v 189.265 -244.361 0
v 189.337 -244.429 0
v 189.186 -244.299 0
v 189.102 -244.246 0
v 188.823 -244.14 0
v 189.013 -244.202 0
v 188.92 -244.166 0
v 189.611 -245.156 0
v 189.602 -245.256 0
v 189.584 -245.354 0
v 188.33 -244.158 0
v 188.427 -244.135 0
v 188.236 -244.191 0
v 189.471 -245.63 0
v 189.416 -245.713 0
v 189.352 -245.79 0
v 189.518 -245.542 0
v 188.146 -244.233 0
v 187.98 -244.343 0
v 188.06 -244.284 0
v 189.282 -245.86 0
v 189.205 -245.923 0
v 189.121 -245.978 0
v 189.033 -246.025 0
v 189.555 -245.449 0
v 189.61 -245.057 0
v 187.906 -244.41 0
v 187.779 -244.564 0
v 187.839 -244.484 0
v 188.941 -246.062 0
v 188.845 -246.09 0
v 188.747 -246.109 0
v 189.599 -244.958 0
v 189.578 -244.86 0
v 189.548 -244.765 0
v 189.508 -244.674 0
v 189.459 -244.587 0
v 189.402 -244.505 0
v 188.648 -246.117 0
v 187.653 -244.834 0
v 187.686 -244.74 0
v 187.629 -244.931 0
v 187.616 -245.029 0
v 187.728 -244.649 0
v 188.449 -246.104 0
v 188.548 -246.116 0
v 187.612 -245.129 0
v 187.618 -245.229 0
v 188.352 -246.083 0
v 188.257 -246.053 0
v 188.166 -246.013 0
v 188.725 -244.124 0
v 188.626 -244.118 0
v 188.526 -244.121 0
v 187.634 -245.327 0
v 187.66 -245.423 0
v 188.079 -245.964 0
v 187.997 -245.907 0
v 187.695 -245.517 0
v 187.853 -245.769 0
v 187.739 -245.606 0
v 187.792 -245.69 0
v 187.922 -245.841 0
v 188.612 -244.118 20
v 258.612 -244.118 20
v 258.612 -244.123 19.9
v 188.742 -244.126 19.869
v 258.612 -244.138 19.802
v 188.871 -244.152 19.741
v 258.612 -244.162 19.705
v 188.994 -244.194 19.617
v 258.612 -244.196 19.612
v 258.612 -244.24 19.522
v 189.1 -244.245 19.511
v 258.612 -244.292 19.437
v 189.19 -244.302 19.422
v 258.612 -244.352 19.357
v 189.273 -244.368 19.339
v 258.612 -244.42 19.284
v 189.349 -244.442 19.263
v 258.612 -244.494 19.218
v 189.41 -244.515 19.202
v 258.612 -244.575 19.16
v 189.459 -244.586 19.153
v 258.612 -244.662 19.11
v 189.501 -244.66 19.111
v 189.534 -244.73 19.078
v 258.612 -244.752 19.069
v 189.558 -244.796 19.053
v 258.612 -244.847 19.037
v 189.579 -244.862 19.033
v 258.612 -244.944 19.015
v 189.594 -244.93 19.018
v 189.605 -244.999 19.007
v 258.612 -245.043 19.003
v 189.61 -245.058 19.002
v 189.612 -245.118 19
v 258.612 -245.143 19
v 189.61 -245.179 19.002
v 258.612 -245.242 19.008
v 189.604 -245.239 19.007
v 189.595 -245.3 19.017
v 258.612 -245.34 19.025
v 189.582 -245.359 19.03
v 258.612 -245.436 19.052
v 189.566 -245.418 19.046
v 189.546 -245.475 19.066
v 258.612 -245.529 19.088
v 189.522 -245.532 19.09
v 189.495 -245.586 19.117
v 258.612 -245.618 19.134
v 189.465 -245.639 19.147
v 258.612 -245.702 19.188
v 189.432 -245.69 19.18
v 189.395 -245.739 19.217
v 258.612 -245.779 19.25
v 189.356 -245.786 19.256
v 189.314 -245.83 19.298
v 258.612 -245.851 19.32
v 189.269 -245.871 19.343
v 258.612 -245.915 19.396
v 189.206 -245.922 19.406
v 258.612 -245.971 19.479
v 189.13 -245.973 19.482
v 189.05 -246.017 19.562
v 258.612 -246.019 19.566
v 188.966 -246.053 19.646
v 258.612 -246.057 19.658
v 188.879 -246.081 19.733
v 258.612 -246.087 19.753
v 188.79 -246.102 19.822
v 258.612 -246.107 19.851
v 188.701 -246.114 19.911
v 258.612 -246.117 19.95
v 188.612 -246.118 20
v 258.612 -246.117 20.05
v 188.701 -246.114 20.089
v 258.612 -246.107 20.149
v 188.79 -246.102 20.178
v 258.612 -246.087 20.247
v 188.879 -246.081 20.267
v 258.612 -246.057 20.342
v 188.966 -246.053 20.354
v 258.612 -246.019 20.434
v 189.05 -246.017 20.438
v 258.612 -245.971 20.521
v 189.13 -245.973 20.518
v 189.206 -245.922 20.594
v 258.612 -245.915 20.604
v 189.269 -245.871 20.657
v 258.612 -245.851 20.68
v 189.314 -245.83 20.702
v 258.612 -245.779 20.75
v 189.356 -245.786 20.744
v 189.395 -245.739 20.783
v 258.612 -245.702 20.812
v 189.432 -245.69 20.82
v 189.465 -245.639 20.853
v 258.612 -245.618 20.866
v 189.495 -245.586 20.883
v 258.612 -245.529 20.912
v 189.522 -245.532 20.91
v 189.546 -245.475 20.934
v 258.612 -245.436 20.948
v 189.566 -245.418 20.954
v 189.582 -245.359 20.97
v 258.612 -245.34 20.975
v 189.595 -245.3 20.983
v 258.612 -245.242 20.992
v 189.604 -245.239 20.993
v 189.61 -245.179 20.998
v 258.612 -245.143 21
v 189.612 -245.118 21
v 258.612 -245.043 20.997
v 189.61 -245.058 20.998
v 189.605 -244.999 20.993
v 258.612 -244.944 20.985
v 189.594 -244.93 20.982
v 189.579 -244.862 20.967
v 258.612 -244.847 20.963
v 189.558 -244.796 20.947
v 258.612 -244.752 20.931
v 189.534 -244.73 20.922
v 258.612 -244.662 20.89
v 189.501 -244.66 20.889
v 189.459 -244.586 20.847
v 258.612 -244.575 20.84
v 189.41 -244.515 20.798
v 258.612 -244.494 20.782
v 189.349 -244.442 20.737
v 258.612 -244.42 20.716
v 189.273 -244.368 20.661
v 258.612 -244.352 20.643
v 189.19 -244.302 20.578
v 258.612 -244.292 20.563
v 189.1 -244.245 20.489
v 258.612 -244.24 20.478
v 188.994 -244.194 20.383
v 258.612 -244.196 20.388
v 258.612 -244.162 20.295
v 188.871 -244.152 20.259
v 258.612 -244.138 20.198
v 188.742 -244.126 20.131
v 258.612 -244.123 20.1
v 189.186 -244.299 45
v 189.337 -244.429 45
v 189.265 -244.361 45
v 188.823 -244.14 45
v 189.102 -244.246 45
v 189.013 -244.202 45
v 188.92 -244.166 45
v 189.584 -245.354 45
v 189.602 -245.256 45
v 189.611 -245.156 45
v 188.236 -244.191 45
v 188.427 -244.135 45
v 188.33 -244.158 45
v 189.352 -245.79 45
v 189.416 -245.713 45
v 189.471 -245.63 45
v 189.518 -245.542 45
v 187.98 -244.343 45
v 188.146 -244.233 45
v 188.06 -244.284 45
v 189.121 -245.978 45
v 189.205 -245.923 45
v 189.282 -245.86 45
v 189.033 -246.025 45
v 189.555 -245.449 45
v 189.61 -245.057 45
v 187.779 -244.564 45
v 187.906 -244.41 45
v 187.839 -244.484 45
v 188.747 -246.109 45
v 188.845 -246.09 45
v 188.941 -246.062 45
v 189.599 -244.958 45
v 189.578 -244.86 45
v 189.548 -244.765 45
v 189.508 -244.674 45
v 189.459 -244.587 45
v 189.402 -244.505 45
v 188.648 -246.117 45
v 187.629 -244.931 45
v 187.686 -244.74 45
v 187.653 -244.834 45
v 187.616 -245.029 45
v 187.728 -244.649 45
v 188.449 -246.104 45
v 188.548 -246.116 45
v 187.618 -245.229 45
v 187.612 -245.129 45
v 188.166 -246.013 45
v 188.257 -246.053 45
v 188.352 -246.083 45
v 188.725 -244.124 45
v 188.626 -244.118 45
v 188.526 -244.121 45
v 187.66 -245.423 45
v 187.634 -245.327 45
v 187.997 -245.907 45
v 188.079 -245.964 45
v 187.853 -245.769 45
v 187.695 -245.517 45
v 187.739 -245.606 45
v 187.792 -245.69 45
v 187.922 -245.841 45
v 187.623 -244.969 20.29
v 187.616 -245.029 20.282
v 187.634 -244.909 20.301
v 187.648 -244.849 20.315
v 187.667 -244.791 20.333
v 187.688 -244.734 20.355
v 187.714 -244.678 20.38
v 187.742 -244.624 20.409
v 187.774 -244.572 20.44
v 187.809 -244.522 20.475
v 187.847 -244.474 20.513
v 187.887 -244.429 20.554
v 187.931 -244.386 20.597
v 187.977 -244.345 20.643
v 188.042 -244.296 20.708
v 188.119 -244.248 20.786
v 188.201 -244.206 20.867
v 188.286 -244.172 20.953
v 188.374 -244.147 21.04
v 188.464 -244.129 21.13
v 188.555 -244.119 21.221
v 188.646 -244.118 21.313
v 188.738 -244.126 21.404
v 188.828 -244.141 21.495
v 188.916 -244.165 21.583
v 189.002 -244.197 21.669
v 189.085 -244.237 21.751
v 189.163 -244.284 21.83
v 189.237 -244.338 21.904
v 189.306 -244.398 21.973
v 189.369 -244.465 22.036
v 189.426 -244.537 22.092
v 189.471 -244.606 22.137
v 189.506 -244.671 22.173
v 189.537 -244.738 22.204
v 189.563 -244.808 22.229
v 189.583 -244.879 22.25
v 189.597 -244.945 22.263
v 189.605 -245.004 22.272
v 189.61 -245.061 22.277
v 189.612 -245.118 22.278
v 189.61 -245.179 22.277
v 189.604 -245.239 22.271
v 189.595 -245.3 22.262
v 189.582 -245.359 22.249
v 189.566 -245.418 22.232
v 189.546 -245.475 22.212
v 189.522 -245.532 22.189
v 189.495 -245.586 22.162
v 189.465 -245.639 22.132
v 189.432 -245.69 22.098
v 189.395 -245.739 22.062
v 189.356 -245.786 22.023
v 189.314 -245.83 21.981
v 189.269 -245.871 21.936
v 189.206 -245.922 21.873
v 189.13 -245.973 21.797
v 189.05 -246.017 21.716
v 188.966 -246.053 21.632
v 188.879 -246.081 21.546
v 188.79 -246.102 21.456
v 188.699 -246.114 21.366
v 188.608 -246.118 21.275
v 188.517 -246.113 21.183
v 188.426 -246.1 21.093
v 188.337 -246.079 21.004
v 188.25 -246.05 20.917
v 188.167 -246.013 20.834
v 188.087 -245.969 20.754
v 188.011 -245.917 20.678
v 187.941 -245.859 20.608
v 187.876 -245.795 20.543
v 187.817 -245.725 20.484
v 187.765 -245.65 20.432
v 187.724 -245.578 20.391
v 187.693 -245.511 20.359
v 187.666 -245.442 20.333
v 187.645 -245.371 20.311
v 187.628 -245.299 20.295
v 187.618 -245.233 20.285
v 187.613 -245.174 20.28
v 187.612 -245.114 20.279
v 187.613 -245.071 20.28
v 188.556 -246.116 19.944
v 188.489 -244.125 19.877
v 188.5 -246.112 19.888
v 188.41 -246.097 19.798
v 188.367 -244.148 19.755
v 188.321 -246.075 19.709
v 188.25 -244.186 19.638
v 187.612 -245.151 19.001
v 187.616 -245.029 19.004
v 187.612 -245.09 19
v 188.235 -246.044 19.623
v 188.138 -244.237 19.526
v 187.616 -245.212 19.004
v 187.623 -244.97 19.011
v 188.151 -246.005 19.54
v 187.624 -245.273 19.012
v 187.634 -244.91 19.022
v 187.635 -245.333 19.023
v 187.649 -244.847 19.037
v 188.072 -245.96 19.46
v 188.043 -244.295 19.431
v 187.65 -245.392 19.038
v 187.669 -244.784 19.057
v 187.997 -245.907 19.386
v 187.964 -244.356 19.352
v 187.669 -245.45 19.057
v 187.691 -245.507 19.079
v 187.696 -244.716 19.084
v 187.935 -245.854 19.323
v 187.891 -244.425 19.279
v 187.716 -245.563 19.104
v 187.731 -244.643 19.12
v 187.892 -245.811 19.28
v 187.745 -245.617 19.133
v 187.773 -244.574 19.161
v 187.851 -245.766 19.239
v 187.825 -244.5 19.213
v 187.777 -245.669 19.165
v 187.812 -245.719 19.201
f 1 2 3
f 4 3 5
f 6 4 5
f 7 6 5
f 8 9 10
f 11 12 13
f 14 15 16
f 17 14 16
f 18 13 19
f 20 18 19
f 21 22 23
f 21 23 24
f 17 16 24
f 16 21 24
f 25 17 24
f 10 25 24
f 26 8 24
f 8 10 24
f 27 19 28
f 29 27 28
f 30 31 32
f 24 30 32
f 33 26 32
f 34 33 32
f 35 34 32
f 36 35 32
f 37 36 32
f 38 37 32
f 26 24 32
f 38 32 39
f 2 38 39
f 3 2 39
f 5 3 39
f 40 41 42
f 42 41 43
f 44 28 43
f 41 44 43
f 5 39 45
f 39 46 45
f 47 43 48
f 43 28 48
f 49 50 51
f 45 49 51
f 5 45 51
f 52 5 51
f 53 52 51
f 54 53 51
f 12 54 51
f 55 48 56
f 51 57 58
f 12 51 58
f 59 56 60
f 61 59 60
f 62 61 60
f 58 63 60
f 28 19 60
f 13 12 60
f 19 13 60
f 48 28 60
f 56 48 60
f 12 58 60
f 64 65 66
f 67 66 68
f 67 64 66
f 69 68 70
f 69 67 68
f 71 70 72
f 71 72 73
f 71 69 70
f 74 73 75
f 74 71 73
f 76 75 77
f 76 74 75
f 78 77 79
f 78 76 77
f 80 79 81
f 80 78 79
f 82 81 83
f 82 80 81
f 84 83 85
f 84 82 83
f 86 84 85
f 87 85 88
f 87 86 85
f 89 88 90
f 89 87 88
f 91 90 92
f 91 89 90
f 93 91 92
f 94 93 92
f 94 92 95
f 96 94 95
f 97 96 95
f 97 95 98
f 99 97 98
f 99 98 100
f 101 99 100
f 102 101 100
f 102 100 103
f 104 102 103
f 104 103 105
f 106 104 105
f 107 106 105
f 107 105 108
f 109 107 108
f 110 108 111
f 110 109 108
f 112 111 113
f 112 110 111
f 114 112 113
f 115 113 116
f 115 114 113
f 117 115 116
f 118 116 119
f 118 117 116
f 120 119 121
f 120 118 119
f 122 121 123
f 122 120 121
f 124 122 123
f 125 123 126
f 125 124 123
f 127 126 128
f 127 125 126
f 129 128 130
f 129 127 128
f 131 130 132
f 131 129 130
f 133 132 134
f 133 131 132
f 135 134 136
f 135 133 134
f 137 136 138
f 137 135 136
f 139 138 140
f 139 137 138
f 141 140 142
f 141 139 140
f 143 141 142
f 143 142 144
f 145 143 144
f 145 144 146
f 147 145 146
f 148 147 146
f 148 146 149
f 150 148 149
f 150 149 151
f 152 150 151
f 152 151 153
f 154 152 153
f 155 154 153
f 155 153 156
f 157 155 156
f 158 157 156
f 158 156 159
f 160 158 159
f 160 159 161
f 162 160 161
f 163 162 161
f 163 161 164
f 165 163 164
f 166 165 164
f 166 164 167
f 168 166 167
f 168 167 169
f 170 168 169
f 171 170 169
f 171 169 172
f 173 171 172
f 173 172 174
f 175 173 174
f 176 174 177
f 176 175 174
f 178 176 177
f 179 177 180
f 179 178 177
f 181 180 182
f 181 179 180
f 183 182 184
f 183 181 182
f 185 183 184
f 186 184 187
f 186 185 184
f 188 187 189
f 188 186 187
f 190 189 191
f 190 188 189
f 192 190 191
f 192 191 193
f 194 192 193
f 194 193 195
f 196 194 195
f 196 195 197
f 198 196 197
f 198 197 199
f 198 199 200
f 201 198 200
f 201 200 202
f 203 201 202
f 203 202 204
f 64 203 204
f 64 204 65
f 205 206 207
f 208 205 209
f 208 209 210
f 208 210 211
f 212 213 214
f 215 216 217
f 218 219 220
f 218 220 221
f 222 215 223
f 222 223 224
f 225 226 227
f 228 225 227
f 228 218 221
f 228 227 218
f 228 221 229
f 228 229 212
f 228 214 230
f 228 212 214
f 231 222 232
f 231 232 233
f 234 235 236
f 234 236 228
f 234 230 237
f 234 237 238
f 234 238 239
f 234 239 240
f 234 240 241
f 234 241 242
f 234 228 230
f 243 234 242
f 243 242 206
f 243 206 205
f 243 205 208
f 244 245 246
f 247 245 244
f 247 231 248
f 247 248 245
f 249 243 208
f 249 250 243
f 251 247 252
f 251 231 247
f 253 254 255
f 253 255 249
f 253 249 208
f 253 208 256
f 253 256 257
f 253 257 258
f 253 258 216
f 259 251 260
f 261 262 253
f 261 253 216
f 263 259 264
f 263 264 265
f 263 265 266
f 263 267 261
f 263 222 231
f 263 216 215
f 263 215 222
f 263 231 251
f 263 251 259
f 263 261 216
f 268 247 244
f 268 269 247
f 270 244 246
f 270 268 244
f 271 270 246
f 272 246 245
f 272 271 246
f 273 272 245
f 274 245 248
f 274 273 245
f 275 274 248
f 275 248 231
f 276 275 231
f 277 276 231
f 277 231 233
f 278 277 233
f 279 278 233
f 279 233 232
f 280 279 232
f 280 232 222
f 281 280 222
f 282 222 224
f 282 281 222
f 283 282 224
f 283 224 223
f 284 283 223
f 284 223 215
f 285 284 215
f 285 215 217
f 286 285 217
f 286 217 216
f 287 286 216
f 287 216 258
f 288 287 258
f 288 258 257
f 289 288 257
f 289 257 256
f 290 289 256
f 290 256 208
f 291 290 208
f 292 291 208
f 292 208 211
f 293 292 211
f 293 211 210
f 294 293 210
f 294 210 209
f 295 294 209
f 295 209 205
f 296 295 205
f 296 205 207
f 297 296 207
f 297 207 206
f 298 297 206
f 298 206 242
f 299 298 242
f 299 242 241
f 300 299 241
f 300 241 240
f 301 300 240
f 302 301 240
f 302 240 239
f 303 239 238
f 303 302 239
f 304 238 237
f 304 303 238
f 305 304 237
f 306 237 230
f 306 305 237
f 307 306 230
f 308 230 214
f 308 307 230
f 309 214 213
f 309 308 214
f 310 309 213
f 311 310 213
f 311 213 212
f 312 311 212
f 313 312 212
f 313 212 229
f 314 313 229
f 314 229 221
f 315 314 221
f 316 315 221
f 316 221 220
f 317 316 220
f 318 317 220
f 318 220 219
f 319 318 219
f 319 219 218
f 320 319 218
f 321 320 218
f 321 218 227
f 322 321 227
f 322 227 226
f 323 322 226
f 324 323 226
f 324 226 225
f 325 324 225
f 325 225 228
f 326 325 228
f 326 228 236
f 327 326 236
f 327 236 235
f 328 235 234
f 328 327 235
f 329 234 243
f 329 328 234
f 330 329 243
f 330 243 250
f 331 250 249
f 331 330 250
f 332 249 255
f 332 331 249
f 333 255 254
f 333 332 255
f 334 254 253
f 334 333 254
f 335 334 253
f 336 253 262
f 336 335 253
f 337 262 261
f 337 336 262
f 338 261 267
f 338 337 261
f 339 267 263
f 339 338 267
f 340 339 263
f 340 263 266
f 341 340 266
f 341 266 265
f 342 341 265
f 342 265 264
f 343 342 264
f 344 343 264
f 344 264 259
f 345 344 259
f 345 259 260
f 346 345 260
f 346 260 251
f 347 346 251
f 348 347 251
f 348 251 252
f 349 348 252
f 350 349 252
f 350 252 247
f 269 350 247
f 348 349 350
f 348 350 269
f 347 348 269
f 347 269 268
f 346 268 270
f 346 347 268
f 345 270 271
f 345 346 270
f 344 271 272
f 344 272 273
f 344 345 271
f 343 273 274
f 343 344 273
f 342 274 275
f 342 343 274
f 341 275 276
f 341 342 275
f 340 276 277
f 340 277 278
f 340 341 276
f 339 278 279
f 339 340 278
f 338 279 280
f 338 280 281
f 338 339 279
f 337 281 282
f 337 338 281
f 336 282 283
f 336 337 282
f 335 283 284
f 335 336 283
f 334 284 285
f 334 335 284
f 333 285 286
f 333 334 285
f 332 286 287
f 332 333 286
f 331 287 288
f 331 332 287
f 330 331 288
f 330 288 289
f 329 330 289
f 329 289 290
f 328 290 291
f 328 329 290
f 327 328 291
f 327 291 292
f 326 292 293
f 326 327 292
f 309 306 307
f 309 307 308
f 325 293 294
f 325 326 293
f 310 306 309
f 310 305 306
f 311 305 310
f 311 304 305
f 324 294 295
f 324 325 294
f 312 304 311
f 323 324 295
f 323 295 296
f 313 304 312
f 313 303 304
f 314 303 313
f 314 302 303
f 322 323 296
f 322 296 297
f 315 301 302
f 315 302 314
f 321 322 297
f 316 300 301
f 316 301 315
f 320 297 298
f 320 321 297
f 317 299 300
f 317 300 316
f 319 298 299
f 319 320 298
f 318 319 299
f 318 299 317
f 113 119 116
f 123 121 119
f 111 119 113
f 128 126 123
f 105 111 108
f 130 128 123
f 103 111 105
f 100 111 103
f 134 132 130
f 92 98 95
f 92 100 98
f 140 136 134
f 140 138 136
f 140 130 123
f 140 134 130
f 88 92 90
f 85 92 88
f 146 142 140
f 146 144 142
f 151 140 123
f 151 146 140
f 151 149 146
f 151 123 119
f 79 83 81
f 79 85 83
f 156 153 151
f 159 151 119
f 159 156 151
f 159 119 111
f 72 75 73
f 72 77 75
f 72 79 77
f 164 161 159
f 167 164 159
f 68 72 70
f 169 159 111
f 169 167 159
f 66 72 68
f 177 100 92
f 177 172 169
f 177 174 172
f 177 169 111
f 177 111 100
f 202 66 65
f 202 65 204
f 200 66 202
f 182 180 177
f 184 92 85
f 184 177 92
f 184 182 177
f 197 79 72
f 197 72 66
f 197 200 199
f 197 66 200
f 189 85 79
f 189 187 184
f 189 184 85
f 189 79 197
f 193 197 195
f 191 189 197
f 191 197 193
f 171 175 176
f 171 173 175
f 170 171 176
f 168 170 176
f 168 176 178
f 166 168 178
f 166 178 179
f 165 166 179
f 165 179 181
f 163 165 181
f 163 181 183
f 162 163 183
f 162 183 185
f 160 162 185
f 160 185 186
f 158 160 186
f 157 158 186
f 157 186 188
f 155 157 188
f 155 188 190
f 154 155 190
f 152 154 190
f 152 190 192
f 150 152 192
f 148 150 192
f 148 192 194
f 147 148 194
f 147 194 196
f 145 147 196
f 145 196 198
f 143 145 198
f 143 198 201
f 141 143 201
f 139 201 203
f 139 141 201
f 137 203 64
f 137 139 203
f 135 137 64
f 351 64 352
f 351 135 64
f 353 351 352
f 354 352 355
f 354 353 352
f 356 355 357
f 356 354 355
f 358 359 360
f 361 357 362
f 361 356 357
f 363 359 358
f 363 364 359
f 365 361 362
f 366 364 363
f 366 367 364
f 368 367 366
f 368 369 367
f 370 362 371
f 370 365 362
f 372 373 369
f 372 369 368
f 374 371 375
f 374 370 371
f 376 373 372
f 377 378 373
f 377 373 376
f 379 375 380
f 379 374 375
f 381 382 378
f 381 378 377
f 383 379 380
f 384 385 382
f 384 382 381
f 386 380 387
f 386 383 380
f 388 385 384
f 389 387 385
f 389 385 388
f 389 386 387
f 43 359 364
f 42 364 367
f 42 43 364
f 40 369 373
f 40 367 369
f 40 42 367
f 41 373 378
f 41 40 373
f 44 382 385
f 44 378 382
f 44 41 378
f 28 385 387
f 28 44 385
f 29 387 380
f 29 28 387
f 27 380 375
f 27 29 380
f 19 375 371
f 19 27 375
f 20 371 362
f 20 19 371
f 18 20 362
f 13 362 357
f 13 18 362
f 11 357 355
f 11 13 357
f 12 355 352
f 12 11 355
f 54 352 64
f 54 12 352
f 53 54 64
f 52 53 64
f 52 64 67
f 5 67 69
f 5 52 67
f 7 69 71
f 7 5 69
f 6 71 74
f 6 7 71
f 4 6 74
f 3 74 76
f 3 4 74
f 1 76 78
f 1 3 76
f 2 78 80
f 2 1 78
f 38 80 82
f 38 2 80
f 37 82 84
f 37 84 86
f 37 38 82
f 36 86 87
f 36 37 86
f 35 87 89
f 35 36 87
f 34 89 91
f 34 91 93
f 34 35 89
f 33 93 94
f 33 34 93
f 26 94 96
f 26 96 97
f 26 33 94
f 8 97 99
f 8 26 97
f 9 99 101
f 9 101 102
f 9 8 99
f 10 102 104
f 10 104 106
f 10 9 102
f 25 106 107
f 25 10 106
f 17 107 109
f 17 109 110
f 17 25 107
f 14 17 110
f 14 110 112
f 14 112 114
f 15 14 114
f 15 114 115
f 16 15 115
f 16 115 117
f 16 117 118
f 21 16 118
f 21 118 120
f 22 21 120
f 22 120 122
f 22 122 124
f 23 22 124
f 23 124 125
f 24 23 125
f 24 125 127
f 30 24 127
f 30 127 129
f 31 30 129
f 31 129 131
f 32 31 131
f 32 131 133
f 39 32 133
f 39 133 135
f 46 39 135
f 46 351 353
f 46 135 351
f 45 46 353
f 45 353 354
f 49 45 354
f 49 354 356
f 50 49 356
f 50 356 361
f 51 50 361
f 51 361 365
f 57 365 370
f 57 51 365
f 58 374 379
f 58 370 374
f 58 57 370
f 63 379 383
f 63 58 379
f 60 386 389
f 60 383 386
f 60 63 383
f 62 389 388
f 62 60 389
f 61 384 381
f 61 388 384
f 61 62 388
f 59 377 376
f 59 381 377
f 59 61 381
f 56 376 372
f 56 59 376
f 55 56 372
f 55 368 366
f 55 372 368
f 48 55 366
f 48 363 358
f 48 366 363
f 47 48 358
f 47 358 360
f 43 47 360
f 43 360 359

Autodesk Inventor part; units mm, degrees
ref_plane "YZ Plane" through (0, 0, 0) normal (1, 0, 0) x (0, 1, 0)
ref_plane "XZ Plane" through (0, 0, 0) normal (0, 1, 0) x (-1, 0, 0)
ref_plane "XY Plane" through (0, 0, 0) normal (0, 0, 1) x (1, 0, 0)
ref_plane "Work Plane1" through (188.6118, -245.1178, 0) normal (0, 0, 1) x (-0.9961, 0.0884, 0)
sketch "Sketch1" plane through (188.6118, -245.1178, 0) normal (0, 0, 1) x (-0.9961, 0.0884, 0)
  circle A0 centre (0, 0) radius 2.6486 projected
  circle A1 centre (0, 0) radius 1
  point P0 (209.5331, -227.4929)
  dimension "d0" = 2
extrude "Extrusion1" add sketch "Sketch1" along normal blind 45 contours A1
ref_plane "Work Plane2" through (188.6118, -261.1178, -48) normal (1, 0, 0) x (0, 1, 0)
sketch "Sketch2" plane through (188.6118, -261.1178, -48) normal (1, 0, 0) x (0, 1, 0)
  line L0 (17, 93) -> (15, 93) projected
  line L1 (15, 48) -> (17, 48) projected
  circle A0 centre (16, 68) radius 1
  line L2 (15, 48) -> (15, 93) projected
  point P0 (261.1178, 48)
  dimension "d8" = 20
extrude "Extrusion2" add sketch "Sketch2" along normal blind 70
ref_plane "Work Plane3" through (172.6118, -245.1178, 98) normal (0, 1, 0) x (1, 0, 0)
sketch "Sketch3" plane through (172.6118, -245.1178, 98) normal (0, 1, 0) x (1, 0, 0)
  line L0 (86, 77) -> (86, 79) projected
  line L1 (15, 53) -> (17, 53) projected
  line L2 (17, 98) -> (15, 98) projected
  line L3 (17, 77) -> (5.6178, 88.3822)
  line L4 (5.6178, 88.3822) -> (4.9785, 87.7429)
  line L5 (4.9785, 87.7429) -> (17, 75.7215)
  line L6 (17, 75.7215) -> (17, 77)
  line L7 (17, 98) -> (17, 53) projected
  point P0 (-172.6118, 98)
  point P1 (16, 68)
  point P2 (16, 68)
  point P3 (16, 68)
  point P4 (16, 68)
extrude "Extrusion3" cut sketch "Sketch3" along normal mid plane 50
properties part number "00_Beampath_Coupling"
